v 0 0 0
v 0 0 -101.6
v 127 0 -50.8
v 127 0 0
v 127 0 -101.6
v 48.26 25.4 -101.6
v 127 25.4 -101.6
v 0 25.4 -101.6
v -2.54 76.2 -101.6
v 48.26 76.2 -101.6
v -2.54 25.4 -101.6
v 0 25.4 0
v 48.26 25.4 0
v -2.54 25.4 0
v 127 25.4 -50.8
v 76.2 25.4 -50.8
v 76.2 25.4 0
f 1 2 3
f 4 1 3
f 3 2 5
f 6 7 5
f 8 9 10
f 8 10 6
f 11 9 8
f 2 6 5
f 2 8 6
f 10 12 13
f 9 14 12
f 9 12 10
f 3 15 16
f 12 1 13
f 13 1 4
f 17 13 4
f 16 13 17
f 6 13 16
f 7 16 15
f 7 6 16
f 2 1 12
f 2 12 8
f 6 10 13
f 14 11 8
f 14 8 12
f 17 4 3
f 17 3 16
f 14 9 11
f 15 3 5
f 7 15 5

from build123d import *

# Parameters (mm, degrees)
SKETCH2_W           = 127
SKETCH2_H           = 101.6
BOSS_EXTRUDE1_DEPTH = 25.4
CUT_EXTRUDE2_DEPTH  = 50.8
BOSS_EXTRUDE2_DEPTH = 50.8


with BuildPart() as part:
    # Sketch2 → Boss-Extrude1 (new body)
    with BuildSketch(Plane(origin=(0, 0, 0), x_dir=(1, 0, 0), z_dir=(0, 1, 0))):
        with Locations((63.5, 50.8)):
            Rectangle(SKETCH2_W, SKETCH2_H)
    extrude(amount=BOSS_EXTRUDE1_DEPTH)

    # Sketch4 → Cut-Extrude2 (cut)
    with BuildSketch(Plane.XY):
        Polygon((76.2, 25.4), (127, 25.4), (127, 0), align=None)
    extrude(amount=-CUT_EXTRUDE2_DEPTH, mode=Mode.SUBTRACT)

    # Sketch5 → Boss-Extrude2 (add)
    with BuildSketch(Plane.ZY.offset(2.54)):
        Polygon((-101.6, 25.4), (0, 25.4), (-101.6, 76.2), align=None)
    extrude(amount=-BOSS_EXTRUDE2_DEPTH)


solid = part.part
